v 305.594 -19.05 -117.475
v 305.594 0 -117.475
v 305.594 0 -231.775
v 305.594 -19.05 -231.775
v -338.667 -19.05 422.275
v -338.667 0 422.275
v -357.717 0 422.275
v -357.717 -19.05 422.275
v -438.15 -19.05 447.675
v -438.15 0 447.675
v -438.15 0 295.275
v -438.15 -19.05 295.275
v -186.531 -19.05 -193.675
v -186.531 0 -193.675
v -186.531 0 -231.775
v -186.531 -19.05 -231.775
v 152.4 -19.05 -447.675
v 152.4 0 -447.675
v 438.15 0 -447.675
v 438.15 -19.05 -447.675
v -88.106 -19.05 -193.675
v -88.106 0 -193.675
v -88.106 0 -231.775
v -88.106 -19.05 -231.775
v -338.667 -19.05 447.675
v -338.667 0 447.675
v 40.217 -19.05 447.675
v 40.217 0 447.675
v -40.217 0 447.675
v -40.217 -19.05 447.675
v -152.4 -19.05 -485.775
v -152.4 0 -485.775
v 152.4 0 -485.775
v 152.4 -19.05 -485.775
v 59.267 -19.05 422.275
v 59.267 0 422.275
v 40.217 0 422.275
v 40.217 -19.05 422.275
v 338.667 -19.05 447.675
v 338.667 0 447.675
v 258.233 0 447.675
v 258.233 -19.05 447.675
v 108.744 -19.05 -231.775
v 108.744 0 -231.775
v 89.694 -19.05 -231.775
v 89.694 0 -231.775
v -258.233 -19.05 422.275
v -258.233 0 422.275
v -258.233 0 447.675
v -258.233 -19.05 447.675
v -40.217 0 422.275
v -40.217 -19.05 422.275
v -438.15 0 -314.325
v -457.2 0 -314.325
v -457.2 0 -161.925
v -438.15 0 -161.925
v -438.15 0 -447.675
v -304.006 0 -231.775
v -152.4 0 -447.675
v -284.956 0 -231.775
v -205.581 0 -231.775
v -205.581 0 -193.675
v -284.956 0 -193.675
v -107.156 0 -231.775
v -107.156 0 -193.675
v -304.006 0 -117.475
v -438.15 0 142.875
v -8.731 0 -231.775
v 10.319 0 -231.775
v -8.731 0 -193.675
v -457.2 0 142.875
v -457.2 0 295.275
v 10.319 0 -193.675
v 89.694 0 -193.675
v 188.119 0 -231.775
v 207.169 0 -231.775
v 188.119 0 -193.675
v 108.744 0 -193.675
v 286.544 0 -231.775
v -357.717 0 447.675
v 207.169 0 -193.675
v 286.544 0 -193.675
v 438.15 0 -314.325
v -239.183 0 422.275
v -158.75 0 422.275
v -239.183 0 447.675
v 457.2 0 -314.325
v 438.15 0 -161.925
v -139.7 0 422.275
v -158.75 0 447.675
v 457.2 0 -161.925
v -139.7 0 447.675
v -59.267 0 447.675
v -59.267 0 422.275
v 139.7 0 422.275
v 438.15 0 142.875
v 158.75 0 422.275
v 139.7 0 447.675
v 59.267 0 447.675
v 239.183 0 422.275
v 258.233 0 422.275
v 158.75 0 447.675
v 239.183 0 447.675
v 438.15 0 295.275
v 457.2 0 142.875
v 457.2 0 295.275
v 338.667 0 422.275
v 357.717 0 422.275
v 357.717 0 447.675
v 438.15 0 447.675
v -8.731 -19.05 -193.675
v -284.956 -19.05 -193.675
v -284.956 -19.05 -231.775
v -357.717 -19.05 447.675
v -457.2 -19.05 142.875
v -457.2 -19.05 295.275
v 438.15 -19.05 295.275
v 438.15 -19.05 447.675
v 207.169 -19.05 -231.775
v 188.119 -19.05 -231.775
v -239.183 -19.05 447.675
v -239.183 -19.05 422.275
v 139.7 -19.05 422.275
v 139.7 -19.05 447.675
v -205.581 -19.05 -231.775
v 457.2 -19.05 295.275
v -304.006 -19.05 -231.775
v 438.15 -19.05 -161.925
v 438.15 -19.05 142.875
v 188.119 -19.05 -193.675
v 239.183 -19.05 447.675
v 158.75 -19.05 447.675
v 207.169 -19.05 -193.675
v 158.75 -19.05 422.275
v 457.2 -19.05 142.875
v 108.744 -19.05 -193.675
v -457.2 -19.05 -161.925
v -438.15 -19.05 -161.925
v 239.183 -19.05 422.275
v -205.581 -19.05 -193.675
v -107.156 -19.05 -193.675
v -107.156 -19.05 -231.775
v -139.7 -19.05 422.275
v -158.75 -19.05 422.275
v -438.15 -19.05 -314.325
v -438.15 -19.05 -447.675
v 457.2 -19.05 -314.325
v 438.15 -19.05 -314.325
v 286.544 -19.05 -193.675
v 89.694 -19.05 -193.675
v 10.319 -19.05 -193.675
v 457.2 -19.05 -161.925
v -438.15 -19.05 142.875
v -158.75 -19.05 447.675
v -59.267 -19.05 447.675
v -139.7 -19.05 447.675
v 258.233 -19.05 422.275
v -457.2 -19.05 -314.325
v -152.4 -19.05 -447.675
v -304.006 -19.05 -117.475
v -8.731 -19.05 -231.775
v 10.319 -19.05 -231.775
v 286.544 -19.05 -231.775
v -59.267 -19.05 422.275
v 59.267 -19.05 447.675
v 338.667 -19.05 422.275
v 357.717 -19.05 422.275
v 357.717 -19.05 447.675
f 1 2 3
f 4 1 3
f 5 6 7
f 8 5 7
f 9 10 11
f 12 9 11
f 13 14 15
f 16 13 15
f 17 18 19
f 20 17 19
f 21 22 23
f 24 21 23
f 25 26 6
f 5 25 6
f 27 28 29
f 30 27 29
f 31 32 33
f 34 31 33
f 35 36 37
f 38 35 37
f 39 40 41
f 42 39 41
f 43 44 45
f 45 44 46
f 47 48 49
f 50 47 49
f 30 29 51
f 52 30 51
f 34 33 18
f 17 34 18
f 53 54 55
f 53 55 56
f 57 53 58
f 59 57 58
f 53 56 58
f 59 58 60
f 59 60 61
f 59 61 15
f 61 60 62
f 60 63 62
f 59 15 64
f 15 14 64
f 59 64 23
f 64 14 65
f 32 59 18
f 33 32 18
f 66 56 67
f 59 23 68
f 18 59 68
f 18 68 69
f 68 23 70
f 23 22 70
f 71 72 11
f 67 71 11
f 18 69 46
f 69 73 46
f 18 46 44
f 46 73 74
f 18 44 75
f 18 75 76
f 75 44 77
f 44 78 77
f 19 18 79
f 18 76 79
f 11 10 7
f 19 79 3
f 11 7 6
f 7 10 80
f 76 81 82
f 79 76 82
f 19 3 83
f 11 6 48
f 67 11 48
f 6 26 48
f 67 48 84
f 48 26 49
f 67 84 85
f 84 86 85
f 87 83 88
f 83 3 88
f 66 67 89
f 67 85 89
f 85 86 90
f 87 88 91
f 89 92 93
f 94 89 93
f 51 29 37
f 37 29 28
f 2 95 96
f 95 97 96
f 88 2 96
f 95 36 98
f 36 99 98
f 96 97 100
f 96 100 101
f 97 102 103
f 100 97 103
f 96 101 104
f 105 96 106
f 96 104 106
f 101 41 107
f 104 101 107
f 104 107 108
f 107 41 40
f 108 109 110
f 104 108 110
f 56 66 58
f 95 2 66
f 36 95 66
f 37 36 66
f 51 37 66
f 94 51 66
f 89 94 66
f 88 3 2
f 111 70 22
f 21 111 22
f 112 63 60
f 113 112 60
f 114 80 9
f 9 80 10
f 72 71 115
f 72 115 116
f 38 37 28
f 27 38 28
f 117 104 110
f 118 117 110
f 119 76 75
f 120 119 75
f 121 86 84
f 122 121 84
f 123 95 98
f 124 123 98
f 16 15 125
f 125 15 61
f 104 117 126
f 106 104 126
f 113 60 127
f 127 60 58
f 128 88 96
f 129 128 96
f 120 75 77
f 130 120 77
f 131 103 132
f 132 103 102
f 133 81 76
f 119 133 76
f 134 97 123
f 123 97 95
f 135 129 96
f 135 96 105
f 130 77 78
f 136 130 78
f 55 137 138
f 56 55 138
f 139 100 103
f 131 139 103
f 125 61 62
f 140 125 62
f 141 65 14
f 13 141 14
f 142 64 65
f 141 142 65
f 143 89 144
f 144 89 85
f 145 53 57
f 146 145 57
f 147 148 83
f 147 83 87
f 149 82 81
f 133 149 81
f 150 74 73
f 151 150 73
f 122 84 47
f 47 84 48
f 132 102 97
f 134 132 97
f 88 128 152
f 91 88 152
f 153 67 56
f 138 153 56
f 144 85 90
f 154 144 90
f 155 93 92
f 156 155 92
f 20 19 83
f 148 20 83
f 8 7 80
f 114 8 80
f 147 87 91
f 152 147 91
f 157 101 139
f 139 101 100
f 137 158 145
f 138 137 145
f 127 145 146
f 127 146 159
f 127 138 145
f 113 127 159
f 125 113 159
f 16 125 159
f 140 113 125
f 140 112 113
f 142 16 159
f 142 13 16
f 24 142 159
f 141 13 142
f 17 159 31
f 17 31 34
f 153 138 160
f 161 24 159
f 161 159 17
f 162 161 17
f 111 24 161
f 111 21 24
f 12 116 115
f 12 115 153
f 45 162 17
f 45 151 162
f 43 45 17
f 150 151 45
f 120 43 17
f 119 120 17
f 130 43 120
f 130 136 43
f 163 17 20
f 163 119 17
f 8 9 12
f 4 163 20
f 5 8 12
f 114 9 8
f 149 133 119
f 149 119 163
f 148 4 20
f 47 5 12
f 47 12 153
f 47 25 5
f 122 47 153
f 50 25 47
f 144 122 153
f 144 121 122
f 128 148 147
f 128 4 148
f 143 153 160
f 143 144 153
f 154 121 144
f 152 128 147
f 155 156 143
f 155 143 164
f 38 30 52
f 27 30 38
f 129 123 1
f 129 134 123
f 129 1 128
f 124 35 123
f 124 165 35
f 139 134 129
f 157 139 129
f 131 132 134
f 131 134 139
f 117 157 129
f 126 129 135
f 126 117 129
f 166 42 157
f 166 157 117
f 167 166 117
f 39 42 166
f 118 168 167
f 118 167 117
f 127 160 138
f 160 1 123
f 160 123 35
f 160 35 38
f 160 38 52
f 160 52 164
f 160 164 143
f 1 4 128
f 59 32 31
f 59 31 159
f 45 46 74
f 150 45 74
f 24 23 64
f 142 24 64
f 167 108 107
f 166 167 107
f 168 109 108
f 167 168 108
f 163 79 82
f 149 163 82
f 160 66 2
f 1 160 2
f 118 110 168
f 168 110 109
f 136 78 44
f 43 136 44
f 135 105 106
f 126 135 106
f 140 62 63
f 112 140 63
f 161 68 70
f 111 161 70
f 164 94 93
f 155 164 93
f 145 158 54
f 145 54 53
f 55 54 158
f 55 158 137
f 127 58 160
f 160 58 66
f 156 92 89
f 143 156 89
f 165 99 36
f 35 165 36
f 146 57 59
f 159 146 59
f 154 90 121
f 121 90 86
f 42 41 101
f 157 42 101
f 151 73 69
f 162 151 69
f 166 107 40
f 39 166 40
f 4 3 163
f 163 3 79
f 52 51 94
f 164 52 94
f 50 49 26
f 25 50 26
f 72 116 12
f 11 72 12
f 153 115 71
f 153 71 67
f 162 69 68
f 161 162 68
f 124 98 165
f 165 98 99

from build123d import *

# Parameters (mm, degrees)
F0_W     = 19.05
F0_H     = 152.4
F0_W_2   = 304.8
F0_H_2   = 38.1
F1_DEPTH = 19.05


with BuildPart() as f1:
    # F0 (on Front) → F1 (new body)
    with BuildSketch(Plane.XZ):
        Polygon((-438.15, -314.325), (-438.15, -447.675), (-152.4, -447.675), (152.4, -447.675), (438.15, -447.675), (438.15, -314.325), (438.15, -161.925), (438.15, 142.875), (438.15, 295.275), (438.15, 447.675), (357.716667, 447.675), (357.716667, 422.275), (338.666667, 422.275), (338.666667, 447.675), (258.233333, 447.675), (258.233333, 422.275), (239.183333, 422.275), (239.183333, 447.675), (158.75, 447.675), (158.75, 422.275), (139.7, 422.275), (139.7, 447.675), (59.266667, 447.675), (59.266667, 422.275), (40.216667, 422.275), (40.216667, 447.675), (-40.216667, 447.675), (-40.216667, 422.275), (-59.266667, 422.275), (-59.266667, 447.675), (-139.7, 447.675), (-139.7, 422.275), (-158.75, 422.275), (-158.75, 447.675), (-239.183333, 447.675), (-239.183333, 422.275), (-258.233333, 422.275), (-258.233333, 447.675), (-338.666667, 447.675), (-338.666667, 422.275), (-357.716667, 422.275), (-357.716667, 447.675), (-438.15, 447.675), (-438.15, 295.275), (-438.15, 142.875), (-438.15, -161.925), align=None)
        Polygon((-304.00625, -193.675), (-304.00625, -117.475), (305.59375, -117.475), (305.59375, -193.675), (305.59375, -231.775), (286.54375, -231.775), (286.54375, -193.675), (207.16875, -193.675), (207.16875, -231.775), (188.11875, -231.775), (188.11875, -193.675), (108.74375, -193.675), (108.74375, -231.775), (89.69375, -231.775), (89.69375, -193.675), (10.31875, -193.675), (10.31875, -231.775), (-8.73125, -231.775), (-8.73125, -193.675), (-88.10625, -193.675), (-88.10625, -231.775), (-107.15625, -231.775), (-107.15625, -193.675), (-186.53125, -193.675), (-186.53125, -231.775), (-205.58125, -231.775), (-205.58125, -193.675), (-284.95625, -193.675), (-284.95625, -231.775), (-304.00625, -231.775), align=None, mode=Mode.SUBTRACT)
        with Locations((-447.675, 219.075)):
            Rectangle(F0_W, F0_H)
        with Locations((-447.675, -238.125)):
            Rectangle(F0_W, F0_H)
        with Locations((0, -466.725)):
            Rectangle(F0_W_2, F0_H_2)
        with Locations((447.675, -238.125)):
            Rectangle(F0_W, F0_H)
        with Locations((447.675, 219.075)):
            Rectangle(F0_W, F0_H)
    extrude(amount=F1_DEPTH)


solid = f1.part
